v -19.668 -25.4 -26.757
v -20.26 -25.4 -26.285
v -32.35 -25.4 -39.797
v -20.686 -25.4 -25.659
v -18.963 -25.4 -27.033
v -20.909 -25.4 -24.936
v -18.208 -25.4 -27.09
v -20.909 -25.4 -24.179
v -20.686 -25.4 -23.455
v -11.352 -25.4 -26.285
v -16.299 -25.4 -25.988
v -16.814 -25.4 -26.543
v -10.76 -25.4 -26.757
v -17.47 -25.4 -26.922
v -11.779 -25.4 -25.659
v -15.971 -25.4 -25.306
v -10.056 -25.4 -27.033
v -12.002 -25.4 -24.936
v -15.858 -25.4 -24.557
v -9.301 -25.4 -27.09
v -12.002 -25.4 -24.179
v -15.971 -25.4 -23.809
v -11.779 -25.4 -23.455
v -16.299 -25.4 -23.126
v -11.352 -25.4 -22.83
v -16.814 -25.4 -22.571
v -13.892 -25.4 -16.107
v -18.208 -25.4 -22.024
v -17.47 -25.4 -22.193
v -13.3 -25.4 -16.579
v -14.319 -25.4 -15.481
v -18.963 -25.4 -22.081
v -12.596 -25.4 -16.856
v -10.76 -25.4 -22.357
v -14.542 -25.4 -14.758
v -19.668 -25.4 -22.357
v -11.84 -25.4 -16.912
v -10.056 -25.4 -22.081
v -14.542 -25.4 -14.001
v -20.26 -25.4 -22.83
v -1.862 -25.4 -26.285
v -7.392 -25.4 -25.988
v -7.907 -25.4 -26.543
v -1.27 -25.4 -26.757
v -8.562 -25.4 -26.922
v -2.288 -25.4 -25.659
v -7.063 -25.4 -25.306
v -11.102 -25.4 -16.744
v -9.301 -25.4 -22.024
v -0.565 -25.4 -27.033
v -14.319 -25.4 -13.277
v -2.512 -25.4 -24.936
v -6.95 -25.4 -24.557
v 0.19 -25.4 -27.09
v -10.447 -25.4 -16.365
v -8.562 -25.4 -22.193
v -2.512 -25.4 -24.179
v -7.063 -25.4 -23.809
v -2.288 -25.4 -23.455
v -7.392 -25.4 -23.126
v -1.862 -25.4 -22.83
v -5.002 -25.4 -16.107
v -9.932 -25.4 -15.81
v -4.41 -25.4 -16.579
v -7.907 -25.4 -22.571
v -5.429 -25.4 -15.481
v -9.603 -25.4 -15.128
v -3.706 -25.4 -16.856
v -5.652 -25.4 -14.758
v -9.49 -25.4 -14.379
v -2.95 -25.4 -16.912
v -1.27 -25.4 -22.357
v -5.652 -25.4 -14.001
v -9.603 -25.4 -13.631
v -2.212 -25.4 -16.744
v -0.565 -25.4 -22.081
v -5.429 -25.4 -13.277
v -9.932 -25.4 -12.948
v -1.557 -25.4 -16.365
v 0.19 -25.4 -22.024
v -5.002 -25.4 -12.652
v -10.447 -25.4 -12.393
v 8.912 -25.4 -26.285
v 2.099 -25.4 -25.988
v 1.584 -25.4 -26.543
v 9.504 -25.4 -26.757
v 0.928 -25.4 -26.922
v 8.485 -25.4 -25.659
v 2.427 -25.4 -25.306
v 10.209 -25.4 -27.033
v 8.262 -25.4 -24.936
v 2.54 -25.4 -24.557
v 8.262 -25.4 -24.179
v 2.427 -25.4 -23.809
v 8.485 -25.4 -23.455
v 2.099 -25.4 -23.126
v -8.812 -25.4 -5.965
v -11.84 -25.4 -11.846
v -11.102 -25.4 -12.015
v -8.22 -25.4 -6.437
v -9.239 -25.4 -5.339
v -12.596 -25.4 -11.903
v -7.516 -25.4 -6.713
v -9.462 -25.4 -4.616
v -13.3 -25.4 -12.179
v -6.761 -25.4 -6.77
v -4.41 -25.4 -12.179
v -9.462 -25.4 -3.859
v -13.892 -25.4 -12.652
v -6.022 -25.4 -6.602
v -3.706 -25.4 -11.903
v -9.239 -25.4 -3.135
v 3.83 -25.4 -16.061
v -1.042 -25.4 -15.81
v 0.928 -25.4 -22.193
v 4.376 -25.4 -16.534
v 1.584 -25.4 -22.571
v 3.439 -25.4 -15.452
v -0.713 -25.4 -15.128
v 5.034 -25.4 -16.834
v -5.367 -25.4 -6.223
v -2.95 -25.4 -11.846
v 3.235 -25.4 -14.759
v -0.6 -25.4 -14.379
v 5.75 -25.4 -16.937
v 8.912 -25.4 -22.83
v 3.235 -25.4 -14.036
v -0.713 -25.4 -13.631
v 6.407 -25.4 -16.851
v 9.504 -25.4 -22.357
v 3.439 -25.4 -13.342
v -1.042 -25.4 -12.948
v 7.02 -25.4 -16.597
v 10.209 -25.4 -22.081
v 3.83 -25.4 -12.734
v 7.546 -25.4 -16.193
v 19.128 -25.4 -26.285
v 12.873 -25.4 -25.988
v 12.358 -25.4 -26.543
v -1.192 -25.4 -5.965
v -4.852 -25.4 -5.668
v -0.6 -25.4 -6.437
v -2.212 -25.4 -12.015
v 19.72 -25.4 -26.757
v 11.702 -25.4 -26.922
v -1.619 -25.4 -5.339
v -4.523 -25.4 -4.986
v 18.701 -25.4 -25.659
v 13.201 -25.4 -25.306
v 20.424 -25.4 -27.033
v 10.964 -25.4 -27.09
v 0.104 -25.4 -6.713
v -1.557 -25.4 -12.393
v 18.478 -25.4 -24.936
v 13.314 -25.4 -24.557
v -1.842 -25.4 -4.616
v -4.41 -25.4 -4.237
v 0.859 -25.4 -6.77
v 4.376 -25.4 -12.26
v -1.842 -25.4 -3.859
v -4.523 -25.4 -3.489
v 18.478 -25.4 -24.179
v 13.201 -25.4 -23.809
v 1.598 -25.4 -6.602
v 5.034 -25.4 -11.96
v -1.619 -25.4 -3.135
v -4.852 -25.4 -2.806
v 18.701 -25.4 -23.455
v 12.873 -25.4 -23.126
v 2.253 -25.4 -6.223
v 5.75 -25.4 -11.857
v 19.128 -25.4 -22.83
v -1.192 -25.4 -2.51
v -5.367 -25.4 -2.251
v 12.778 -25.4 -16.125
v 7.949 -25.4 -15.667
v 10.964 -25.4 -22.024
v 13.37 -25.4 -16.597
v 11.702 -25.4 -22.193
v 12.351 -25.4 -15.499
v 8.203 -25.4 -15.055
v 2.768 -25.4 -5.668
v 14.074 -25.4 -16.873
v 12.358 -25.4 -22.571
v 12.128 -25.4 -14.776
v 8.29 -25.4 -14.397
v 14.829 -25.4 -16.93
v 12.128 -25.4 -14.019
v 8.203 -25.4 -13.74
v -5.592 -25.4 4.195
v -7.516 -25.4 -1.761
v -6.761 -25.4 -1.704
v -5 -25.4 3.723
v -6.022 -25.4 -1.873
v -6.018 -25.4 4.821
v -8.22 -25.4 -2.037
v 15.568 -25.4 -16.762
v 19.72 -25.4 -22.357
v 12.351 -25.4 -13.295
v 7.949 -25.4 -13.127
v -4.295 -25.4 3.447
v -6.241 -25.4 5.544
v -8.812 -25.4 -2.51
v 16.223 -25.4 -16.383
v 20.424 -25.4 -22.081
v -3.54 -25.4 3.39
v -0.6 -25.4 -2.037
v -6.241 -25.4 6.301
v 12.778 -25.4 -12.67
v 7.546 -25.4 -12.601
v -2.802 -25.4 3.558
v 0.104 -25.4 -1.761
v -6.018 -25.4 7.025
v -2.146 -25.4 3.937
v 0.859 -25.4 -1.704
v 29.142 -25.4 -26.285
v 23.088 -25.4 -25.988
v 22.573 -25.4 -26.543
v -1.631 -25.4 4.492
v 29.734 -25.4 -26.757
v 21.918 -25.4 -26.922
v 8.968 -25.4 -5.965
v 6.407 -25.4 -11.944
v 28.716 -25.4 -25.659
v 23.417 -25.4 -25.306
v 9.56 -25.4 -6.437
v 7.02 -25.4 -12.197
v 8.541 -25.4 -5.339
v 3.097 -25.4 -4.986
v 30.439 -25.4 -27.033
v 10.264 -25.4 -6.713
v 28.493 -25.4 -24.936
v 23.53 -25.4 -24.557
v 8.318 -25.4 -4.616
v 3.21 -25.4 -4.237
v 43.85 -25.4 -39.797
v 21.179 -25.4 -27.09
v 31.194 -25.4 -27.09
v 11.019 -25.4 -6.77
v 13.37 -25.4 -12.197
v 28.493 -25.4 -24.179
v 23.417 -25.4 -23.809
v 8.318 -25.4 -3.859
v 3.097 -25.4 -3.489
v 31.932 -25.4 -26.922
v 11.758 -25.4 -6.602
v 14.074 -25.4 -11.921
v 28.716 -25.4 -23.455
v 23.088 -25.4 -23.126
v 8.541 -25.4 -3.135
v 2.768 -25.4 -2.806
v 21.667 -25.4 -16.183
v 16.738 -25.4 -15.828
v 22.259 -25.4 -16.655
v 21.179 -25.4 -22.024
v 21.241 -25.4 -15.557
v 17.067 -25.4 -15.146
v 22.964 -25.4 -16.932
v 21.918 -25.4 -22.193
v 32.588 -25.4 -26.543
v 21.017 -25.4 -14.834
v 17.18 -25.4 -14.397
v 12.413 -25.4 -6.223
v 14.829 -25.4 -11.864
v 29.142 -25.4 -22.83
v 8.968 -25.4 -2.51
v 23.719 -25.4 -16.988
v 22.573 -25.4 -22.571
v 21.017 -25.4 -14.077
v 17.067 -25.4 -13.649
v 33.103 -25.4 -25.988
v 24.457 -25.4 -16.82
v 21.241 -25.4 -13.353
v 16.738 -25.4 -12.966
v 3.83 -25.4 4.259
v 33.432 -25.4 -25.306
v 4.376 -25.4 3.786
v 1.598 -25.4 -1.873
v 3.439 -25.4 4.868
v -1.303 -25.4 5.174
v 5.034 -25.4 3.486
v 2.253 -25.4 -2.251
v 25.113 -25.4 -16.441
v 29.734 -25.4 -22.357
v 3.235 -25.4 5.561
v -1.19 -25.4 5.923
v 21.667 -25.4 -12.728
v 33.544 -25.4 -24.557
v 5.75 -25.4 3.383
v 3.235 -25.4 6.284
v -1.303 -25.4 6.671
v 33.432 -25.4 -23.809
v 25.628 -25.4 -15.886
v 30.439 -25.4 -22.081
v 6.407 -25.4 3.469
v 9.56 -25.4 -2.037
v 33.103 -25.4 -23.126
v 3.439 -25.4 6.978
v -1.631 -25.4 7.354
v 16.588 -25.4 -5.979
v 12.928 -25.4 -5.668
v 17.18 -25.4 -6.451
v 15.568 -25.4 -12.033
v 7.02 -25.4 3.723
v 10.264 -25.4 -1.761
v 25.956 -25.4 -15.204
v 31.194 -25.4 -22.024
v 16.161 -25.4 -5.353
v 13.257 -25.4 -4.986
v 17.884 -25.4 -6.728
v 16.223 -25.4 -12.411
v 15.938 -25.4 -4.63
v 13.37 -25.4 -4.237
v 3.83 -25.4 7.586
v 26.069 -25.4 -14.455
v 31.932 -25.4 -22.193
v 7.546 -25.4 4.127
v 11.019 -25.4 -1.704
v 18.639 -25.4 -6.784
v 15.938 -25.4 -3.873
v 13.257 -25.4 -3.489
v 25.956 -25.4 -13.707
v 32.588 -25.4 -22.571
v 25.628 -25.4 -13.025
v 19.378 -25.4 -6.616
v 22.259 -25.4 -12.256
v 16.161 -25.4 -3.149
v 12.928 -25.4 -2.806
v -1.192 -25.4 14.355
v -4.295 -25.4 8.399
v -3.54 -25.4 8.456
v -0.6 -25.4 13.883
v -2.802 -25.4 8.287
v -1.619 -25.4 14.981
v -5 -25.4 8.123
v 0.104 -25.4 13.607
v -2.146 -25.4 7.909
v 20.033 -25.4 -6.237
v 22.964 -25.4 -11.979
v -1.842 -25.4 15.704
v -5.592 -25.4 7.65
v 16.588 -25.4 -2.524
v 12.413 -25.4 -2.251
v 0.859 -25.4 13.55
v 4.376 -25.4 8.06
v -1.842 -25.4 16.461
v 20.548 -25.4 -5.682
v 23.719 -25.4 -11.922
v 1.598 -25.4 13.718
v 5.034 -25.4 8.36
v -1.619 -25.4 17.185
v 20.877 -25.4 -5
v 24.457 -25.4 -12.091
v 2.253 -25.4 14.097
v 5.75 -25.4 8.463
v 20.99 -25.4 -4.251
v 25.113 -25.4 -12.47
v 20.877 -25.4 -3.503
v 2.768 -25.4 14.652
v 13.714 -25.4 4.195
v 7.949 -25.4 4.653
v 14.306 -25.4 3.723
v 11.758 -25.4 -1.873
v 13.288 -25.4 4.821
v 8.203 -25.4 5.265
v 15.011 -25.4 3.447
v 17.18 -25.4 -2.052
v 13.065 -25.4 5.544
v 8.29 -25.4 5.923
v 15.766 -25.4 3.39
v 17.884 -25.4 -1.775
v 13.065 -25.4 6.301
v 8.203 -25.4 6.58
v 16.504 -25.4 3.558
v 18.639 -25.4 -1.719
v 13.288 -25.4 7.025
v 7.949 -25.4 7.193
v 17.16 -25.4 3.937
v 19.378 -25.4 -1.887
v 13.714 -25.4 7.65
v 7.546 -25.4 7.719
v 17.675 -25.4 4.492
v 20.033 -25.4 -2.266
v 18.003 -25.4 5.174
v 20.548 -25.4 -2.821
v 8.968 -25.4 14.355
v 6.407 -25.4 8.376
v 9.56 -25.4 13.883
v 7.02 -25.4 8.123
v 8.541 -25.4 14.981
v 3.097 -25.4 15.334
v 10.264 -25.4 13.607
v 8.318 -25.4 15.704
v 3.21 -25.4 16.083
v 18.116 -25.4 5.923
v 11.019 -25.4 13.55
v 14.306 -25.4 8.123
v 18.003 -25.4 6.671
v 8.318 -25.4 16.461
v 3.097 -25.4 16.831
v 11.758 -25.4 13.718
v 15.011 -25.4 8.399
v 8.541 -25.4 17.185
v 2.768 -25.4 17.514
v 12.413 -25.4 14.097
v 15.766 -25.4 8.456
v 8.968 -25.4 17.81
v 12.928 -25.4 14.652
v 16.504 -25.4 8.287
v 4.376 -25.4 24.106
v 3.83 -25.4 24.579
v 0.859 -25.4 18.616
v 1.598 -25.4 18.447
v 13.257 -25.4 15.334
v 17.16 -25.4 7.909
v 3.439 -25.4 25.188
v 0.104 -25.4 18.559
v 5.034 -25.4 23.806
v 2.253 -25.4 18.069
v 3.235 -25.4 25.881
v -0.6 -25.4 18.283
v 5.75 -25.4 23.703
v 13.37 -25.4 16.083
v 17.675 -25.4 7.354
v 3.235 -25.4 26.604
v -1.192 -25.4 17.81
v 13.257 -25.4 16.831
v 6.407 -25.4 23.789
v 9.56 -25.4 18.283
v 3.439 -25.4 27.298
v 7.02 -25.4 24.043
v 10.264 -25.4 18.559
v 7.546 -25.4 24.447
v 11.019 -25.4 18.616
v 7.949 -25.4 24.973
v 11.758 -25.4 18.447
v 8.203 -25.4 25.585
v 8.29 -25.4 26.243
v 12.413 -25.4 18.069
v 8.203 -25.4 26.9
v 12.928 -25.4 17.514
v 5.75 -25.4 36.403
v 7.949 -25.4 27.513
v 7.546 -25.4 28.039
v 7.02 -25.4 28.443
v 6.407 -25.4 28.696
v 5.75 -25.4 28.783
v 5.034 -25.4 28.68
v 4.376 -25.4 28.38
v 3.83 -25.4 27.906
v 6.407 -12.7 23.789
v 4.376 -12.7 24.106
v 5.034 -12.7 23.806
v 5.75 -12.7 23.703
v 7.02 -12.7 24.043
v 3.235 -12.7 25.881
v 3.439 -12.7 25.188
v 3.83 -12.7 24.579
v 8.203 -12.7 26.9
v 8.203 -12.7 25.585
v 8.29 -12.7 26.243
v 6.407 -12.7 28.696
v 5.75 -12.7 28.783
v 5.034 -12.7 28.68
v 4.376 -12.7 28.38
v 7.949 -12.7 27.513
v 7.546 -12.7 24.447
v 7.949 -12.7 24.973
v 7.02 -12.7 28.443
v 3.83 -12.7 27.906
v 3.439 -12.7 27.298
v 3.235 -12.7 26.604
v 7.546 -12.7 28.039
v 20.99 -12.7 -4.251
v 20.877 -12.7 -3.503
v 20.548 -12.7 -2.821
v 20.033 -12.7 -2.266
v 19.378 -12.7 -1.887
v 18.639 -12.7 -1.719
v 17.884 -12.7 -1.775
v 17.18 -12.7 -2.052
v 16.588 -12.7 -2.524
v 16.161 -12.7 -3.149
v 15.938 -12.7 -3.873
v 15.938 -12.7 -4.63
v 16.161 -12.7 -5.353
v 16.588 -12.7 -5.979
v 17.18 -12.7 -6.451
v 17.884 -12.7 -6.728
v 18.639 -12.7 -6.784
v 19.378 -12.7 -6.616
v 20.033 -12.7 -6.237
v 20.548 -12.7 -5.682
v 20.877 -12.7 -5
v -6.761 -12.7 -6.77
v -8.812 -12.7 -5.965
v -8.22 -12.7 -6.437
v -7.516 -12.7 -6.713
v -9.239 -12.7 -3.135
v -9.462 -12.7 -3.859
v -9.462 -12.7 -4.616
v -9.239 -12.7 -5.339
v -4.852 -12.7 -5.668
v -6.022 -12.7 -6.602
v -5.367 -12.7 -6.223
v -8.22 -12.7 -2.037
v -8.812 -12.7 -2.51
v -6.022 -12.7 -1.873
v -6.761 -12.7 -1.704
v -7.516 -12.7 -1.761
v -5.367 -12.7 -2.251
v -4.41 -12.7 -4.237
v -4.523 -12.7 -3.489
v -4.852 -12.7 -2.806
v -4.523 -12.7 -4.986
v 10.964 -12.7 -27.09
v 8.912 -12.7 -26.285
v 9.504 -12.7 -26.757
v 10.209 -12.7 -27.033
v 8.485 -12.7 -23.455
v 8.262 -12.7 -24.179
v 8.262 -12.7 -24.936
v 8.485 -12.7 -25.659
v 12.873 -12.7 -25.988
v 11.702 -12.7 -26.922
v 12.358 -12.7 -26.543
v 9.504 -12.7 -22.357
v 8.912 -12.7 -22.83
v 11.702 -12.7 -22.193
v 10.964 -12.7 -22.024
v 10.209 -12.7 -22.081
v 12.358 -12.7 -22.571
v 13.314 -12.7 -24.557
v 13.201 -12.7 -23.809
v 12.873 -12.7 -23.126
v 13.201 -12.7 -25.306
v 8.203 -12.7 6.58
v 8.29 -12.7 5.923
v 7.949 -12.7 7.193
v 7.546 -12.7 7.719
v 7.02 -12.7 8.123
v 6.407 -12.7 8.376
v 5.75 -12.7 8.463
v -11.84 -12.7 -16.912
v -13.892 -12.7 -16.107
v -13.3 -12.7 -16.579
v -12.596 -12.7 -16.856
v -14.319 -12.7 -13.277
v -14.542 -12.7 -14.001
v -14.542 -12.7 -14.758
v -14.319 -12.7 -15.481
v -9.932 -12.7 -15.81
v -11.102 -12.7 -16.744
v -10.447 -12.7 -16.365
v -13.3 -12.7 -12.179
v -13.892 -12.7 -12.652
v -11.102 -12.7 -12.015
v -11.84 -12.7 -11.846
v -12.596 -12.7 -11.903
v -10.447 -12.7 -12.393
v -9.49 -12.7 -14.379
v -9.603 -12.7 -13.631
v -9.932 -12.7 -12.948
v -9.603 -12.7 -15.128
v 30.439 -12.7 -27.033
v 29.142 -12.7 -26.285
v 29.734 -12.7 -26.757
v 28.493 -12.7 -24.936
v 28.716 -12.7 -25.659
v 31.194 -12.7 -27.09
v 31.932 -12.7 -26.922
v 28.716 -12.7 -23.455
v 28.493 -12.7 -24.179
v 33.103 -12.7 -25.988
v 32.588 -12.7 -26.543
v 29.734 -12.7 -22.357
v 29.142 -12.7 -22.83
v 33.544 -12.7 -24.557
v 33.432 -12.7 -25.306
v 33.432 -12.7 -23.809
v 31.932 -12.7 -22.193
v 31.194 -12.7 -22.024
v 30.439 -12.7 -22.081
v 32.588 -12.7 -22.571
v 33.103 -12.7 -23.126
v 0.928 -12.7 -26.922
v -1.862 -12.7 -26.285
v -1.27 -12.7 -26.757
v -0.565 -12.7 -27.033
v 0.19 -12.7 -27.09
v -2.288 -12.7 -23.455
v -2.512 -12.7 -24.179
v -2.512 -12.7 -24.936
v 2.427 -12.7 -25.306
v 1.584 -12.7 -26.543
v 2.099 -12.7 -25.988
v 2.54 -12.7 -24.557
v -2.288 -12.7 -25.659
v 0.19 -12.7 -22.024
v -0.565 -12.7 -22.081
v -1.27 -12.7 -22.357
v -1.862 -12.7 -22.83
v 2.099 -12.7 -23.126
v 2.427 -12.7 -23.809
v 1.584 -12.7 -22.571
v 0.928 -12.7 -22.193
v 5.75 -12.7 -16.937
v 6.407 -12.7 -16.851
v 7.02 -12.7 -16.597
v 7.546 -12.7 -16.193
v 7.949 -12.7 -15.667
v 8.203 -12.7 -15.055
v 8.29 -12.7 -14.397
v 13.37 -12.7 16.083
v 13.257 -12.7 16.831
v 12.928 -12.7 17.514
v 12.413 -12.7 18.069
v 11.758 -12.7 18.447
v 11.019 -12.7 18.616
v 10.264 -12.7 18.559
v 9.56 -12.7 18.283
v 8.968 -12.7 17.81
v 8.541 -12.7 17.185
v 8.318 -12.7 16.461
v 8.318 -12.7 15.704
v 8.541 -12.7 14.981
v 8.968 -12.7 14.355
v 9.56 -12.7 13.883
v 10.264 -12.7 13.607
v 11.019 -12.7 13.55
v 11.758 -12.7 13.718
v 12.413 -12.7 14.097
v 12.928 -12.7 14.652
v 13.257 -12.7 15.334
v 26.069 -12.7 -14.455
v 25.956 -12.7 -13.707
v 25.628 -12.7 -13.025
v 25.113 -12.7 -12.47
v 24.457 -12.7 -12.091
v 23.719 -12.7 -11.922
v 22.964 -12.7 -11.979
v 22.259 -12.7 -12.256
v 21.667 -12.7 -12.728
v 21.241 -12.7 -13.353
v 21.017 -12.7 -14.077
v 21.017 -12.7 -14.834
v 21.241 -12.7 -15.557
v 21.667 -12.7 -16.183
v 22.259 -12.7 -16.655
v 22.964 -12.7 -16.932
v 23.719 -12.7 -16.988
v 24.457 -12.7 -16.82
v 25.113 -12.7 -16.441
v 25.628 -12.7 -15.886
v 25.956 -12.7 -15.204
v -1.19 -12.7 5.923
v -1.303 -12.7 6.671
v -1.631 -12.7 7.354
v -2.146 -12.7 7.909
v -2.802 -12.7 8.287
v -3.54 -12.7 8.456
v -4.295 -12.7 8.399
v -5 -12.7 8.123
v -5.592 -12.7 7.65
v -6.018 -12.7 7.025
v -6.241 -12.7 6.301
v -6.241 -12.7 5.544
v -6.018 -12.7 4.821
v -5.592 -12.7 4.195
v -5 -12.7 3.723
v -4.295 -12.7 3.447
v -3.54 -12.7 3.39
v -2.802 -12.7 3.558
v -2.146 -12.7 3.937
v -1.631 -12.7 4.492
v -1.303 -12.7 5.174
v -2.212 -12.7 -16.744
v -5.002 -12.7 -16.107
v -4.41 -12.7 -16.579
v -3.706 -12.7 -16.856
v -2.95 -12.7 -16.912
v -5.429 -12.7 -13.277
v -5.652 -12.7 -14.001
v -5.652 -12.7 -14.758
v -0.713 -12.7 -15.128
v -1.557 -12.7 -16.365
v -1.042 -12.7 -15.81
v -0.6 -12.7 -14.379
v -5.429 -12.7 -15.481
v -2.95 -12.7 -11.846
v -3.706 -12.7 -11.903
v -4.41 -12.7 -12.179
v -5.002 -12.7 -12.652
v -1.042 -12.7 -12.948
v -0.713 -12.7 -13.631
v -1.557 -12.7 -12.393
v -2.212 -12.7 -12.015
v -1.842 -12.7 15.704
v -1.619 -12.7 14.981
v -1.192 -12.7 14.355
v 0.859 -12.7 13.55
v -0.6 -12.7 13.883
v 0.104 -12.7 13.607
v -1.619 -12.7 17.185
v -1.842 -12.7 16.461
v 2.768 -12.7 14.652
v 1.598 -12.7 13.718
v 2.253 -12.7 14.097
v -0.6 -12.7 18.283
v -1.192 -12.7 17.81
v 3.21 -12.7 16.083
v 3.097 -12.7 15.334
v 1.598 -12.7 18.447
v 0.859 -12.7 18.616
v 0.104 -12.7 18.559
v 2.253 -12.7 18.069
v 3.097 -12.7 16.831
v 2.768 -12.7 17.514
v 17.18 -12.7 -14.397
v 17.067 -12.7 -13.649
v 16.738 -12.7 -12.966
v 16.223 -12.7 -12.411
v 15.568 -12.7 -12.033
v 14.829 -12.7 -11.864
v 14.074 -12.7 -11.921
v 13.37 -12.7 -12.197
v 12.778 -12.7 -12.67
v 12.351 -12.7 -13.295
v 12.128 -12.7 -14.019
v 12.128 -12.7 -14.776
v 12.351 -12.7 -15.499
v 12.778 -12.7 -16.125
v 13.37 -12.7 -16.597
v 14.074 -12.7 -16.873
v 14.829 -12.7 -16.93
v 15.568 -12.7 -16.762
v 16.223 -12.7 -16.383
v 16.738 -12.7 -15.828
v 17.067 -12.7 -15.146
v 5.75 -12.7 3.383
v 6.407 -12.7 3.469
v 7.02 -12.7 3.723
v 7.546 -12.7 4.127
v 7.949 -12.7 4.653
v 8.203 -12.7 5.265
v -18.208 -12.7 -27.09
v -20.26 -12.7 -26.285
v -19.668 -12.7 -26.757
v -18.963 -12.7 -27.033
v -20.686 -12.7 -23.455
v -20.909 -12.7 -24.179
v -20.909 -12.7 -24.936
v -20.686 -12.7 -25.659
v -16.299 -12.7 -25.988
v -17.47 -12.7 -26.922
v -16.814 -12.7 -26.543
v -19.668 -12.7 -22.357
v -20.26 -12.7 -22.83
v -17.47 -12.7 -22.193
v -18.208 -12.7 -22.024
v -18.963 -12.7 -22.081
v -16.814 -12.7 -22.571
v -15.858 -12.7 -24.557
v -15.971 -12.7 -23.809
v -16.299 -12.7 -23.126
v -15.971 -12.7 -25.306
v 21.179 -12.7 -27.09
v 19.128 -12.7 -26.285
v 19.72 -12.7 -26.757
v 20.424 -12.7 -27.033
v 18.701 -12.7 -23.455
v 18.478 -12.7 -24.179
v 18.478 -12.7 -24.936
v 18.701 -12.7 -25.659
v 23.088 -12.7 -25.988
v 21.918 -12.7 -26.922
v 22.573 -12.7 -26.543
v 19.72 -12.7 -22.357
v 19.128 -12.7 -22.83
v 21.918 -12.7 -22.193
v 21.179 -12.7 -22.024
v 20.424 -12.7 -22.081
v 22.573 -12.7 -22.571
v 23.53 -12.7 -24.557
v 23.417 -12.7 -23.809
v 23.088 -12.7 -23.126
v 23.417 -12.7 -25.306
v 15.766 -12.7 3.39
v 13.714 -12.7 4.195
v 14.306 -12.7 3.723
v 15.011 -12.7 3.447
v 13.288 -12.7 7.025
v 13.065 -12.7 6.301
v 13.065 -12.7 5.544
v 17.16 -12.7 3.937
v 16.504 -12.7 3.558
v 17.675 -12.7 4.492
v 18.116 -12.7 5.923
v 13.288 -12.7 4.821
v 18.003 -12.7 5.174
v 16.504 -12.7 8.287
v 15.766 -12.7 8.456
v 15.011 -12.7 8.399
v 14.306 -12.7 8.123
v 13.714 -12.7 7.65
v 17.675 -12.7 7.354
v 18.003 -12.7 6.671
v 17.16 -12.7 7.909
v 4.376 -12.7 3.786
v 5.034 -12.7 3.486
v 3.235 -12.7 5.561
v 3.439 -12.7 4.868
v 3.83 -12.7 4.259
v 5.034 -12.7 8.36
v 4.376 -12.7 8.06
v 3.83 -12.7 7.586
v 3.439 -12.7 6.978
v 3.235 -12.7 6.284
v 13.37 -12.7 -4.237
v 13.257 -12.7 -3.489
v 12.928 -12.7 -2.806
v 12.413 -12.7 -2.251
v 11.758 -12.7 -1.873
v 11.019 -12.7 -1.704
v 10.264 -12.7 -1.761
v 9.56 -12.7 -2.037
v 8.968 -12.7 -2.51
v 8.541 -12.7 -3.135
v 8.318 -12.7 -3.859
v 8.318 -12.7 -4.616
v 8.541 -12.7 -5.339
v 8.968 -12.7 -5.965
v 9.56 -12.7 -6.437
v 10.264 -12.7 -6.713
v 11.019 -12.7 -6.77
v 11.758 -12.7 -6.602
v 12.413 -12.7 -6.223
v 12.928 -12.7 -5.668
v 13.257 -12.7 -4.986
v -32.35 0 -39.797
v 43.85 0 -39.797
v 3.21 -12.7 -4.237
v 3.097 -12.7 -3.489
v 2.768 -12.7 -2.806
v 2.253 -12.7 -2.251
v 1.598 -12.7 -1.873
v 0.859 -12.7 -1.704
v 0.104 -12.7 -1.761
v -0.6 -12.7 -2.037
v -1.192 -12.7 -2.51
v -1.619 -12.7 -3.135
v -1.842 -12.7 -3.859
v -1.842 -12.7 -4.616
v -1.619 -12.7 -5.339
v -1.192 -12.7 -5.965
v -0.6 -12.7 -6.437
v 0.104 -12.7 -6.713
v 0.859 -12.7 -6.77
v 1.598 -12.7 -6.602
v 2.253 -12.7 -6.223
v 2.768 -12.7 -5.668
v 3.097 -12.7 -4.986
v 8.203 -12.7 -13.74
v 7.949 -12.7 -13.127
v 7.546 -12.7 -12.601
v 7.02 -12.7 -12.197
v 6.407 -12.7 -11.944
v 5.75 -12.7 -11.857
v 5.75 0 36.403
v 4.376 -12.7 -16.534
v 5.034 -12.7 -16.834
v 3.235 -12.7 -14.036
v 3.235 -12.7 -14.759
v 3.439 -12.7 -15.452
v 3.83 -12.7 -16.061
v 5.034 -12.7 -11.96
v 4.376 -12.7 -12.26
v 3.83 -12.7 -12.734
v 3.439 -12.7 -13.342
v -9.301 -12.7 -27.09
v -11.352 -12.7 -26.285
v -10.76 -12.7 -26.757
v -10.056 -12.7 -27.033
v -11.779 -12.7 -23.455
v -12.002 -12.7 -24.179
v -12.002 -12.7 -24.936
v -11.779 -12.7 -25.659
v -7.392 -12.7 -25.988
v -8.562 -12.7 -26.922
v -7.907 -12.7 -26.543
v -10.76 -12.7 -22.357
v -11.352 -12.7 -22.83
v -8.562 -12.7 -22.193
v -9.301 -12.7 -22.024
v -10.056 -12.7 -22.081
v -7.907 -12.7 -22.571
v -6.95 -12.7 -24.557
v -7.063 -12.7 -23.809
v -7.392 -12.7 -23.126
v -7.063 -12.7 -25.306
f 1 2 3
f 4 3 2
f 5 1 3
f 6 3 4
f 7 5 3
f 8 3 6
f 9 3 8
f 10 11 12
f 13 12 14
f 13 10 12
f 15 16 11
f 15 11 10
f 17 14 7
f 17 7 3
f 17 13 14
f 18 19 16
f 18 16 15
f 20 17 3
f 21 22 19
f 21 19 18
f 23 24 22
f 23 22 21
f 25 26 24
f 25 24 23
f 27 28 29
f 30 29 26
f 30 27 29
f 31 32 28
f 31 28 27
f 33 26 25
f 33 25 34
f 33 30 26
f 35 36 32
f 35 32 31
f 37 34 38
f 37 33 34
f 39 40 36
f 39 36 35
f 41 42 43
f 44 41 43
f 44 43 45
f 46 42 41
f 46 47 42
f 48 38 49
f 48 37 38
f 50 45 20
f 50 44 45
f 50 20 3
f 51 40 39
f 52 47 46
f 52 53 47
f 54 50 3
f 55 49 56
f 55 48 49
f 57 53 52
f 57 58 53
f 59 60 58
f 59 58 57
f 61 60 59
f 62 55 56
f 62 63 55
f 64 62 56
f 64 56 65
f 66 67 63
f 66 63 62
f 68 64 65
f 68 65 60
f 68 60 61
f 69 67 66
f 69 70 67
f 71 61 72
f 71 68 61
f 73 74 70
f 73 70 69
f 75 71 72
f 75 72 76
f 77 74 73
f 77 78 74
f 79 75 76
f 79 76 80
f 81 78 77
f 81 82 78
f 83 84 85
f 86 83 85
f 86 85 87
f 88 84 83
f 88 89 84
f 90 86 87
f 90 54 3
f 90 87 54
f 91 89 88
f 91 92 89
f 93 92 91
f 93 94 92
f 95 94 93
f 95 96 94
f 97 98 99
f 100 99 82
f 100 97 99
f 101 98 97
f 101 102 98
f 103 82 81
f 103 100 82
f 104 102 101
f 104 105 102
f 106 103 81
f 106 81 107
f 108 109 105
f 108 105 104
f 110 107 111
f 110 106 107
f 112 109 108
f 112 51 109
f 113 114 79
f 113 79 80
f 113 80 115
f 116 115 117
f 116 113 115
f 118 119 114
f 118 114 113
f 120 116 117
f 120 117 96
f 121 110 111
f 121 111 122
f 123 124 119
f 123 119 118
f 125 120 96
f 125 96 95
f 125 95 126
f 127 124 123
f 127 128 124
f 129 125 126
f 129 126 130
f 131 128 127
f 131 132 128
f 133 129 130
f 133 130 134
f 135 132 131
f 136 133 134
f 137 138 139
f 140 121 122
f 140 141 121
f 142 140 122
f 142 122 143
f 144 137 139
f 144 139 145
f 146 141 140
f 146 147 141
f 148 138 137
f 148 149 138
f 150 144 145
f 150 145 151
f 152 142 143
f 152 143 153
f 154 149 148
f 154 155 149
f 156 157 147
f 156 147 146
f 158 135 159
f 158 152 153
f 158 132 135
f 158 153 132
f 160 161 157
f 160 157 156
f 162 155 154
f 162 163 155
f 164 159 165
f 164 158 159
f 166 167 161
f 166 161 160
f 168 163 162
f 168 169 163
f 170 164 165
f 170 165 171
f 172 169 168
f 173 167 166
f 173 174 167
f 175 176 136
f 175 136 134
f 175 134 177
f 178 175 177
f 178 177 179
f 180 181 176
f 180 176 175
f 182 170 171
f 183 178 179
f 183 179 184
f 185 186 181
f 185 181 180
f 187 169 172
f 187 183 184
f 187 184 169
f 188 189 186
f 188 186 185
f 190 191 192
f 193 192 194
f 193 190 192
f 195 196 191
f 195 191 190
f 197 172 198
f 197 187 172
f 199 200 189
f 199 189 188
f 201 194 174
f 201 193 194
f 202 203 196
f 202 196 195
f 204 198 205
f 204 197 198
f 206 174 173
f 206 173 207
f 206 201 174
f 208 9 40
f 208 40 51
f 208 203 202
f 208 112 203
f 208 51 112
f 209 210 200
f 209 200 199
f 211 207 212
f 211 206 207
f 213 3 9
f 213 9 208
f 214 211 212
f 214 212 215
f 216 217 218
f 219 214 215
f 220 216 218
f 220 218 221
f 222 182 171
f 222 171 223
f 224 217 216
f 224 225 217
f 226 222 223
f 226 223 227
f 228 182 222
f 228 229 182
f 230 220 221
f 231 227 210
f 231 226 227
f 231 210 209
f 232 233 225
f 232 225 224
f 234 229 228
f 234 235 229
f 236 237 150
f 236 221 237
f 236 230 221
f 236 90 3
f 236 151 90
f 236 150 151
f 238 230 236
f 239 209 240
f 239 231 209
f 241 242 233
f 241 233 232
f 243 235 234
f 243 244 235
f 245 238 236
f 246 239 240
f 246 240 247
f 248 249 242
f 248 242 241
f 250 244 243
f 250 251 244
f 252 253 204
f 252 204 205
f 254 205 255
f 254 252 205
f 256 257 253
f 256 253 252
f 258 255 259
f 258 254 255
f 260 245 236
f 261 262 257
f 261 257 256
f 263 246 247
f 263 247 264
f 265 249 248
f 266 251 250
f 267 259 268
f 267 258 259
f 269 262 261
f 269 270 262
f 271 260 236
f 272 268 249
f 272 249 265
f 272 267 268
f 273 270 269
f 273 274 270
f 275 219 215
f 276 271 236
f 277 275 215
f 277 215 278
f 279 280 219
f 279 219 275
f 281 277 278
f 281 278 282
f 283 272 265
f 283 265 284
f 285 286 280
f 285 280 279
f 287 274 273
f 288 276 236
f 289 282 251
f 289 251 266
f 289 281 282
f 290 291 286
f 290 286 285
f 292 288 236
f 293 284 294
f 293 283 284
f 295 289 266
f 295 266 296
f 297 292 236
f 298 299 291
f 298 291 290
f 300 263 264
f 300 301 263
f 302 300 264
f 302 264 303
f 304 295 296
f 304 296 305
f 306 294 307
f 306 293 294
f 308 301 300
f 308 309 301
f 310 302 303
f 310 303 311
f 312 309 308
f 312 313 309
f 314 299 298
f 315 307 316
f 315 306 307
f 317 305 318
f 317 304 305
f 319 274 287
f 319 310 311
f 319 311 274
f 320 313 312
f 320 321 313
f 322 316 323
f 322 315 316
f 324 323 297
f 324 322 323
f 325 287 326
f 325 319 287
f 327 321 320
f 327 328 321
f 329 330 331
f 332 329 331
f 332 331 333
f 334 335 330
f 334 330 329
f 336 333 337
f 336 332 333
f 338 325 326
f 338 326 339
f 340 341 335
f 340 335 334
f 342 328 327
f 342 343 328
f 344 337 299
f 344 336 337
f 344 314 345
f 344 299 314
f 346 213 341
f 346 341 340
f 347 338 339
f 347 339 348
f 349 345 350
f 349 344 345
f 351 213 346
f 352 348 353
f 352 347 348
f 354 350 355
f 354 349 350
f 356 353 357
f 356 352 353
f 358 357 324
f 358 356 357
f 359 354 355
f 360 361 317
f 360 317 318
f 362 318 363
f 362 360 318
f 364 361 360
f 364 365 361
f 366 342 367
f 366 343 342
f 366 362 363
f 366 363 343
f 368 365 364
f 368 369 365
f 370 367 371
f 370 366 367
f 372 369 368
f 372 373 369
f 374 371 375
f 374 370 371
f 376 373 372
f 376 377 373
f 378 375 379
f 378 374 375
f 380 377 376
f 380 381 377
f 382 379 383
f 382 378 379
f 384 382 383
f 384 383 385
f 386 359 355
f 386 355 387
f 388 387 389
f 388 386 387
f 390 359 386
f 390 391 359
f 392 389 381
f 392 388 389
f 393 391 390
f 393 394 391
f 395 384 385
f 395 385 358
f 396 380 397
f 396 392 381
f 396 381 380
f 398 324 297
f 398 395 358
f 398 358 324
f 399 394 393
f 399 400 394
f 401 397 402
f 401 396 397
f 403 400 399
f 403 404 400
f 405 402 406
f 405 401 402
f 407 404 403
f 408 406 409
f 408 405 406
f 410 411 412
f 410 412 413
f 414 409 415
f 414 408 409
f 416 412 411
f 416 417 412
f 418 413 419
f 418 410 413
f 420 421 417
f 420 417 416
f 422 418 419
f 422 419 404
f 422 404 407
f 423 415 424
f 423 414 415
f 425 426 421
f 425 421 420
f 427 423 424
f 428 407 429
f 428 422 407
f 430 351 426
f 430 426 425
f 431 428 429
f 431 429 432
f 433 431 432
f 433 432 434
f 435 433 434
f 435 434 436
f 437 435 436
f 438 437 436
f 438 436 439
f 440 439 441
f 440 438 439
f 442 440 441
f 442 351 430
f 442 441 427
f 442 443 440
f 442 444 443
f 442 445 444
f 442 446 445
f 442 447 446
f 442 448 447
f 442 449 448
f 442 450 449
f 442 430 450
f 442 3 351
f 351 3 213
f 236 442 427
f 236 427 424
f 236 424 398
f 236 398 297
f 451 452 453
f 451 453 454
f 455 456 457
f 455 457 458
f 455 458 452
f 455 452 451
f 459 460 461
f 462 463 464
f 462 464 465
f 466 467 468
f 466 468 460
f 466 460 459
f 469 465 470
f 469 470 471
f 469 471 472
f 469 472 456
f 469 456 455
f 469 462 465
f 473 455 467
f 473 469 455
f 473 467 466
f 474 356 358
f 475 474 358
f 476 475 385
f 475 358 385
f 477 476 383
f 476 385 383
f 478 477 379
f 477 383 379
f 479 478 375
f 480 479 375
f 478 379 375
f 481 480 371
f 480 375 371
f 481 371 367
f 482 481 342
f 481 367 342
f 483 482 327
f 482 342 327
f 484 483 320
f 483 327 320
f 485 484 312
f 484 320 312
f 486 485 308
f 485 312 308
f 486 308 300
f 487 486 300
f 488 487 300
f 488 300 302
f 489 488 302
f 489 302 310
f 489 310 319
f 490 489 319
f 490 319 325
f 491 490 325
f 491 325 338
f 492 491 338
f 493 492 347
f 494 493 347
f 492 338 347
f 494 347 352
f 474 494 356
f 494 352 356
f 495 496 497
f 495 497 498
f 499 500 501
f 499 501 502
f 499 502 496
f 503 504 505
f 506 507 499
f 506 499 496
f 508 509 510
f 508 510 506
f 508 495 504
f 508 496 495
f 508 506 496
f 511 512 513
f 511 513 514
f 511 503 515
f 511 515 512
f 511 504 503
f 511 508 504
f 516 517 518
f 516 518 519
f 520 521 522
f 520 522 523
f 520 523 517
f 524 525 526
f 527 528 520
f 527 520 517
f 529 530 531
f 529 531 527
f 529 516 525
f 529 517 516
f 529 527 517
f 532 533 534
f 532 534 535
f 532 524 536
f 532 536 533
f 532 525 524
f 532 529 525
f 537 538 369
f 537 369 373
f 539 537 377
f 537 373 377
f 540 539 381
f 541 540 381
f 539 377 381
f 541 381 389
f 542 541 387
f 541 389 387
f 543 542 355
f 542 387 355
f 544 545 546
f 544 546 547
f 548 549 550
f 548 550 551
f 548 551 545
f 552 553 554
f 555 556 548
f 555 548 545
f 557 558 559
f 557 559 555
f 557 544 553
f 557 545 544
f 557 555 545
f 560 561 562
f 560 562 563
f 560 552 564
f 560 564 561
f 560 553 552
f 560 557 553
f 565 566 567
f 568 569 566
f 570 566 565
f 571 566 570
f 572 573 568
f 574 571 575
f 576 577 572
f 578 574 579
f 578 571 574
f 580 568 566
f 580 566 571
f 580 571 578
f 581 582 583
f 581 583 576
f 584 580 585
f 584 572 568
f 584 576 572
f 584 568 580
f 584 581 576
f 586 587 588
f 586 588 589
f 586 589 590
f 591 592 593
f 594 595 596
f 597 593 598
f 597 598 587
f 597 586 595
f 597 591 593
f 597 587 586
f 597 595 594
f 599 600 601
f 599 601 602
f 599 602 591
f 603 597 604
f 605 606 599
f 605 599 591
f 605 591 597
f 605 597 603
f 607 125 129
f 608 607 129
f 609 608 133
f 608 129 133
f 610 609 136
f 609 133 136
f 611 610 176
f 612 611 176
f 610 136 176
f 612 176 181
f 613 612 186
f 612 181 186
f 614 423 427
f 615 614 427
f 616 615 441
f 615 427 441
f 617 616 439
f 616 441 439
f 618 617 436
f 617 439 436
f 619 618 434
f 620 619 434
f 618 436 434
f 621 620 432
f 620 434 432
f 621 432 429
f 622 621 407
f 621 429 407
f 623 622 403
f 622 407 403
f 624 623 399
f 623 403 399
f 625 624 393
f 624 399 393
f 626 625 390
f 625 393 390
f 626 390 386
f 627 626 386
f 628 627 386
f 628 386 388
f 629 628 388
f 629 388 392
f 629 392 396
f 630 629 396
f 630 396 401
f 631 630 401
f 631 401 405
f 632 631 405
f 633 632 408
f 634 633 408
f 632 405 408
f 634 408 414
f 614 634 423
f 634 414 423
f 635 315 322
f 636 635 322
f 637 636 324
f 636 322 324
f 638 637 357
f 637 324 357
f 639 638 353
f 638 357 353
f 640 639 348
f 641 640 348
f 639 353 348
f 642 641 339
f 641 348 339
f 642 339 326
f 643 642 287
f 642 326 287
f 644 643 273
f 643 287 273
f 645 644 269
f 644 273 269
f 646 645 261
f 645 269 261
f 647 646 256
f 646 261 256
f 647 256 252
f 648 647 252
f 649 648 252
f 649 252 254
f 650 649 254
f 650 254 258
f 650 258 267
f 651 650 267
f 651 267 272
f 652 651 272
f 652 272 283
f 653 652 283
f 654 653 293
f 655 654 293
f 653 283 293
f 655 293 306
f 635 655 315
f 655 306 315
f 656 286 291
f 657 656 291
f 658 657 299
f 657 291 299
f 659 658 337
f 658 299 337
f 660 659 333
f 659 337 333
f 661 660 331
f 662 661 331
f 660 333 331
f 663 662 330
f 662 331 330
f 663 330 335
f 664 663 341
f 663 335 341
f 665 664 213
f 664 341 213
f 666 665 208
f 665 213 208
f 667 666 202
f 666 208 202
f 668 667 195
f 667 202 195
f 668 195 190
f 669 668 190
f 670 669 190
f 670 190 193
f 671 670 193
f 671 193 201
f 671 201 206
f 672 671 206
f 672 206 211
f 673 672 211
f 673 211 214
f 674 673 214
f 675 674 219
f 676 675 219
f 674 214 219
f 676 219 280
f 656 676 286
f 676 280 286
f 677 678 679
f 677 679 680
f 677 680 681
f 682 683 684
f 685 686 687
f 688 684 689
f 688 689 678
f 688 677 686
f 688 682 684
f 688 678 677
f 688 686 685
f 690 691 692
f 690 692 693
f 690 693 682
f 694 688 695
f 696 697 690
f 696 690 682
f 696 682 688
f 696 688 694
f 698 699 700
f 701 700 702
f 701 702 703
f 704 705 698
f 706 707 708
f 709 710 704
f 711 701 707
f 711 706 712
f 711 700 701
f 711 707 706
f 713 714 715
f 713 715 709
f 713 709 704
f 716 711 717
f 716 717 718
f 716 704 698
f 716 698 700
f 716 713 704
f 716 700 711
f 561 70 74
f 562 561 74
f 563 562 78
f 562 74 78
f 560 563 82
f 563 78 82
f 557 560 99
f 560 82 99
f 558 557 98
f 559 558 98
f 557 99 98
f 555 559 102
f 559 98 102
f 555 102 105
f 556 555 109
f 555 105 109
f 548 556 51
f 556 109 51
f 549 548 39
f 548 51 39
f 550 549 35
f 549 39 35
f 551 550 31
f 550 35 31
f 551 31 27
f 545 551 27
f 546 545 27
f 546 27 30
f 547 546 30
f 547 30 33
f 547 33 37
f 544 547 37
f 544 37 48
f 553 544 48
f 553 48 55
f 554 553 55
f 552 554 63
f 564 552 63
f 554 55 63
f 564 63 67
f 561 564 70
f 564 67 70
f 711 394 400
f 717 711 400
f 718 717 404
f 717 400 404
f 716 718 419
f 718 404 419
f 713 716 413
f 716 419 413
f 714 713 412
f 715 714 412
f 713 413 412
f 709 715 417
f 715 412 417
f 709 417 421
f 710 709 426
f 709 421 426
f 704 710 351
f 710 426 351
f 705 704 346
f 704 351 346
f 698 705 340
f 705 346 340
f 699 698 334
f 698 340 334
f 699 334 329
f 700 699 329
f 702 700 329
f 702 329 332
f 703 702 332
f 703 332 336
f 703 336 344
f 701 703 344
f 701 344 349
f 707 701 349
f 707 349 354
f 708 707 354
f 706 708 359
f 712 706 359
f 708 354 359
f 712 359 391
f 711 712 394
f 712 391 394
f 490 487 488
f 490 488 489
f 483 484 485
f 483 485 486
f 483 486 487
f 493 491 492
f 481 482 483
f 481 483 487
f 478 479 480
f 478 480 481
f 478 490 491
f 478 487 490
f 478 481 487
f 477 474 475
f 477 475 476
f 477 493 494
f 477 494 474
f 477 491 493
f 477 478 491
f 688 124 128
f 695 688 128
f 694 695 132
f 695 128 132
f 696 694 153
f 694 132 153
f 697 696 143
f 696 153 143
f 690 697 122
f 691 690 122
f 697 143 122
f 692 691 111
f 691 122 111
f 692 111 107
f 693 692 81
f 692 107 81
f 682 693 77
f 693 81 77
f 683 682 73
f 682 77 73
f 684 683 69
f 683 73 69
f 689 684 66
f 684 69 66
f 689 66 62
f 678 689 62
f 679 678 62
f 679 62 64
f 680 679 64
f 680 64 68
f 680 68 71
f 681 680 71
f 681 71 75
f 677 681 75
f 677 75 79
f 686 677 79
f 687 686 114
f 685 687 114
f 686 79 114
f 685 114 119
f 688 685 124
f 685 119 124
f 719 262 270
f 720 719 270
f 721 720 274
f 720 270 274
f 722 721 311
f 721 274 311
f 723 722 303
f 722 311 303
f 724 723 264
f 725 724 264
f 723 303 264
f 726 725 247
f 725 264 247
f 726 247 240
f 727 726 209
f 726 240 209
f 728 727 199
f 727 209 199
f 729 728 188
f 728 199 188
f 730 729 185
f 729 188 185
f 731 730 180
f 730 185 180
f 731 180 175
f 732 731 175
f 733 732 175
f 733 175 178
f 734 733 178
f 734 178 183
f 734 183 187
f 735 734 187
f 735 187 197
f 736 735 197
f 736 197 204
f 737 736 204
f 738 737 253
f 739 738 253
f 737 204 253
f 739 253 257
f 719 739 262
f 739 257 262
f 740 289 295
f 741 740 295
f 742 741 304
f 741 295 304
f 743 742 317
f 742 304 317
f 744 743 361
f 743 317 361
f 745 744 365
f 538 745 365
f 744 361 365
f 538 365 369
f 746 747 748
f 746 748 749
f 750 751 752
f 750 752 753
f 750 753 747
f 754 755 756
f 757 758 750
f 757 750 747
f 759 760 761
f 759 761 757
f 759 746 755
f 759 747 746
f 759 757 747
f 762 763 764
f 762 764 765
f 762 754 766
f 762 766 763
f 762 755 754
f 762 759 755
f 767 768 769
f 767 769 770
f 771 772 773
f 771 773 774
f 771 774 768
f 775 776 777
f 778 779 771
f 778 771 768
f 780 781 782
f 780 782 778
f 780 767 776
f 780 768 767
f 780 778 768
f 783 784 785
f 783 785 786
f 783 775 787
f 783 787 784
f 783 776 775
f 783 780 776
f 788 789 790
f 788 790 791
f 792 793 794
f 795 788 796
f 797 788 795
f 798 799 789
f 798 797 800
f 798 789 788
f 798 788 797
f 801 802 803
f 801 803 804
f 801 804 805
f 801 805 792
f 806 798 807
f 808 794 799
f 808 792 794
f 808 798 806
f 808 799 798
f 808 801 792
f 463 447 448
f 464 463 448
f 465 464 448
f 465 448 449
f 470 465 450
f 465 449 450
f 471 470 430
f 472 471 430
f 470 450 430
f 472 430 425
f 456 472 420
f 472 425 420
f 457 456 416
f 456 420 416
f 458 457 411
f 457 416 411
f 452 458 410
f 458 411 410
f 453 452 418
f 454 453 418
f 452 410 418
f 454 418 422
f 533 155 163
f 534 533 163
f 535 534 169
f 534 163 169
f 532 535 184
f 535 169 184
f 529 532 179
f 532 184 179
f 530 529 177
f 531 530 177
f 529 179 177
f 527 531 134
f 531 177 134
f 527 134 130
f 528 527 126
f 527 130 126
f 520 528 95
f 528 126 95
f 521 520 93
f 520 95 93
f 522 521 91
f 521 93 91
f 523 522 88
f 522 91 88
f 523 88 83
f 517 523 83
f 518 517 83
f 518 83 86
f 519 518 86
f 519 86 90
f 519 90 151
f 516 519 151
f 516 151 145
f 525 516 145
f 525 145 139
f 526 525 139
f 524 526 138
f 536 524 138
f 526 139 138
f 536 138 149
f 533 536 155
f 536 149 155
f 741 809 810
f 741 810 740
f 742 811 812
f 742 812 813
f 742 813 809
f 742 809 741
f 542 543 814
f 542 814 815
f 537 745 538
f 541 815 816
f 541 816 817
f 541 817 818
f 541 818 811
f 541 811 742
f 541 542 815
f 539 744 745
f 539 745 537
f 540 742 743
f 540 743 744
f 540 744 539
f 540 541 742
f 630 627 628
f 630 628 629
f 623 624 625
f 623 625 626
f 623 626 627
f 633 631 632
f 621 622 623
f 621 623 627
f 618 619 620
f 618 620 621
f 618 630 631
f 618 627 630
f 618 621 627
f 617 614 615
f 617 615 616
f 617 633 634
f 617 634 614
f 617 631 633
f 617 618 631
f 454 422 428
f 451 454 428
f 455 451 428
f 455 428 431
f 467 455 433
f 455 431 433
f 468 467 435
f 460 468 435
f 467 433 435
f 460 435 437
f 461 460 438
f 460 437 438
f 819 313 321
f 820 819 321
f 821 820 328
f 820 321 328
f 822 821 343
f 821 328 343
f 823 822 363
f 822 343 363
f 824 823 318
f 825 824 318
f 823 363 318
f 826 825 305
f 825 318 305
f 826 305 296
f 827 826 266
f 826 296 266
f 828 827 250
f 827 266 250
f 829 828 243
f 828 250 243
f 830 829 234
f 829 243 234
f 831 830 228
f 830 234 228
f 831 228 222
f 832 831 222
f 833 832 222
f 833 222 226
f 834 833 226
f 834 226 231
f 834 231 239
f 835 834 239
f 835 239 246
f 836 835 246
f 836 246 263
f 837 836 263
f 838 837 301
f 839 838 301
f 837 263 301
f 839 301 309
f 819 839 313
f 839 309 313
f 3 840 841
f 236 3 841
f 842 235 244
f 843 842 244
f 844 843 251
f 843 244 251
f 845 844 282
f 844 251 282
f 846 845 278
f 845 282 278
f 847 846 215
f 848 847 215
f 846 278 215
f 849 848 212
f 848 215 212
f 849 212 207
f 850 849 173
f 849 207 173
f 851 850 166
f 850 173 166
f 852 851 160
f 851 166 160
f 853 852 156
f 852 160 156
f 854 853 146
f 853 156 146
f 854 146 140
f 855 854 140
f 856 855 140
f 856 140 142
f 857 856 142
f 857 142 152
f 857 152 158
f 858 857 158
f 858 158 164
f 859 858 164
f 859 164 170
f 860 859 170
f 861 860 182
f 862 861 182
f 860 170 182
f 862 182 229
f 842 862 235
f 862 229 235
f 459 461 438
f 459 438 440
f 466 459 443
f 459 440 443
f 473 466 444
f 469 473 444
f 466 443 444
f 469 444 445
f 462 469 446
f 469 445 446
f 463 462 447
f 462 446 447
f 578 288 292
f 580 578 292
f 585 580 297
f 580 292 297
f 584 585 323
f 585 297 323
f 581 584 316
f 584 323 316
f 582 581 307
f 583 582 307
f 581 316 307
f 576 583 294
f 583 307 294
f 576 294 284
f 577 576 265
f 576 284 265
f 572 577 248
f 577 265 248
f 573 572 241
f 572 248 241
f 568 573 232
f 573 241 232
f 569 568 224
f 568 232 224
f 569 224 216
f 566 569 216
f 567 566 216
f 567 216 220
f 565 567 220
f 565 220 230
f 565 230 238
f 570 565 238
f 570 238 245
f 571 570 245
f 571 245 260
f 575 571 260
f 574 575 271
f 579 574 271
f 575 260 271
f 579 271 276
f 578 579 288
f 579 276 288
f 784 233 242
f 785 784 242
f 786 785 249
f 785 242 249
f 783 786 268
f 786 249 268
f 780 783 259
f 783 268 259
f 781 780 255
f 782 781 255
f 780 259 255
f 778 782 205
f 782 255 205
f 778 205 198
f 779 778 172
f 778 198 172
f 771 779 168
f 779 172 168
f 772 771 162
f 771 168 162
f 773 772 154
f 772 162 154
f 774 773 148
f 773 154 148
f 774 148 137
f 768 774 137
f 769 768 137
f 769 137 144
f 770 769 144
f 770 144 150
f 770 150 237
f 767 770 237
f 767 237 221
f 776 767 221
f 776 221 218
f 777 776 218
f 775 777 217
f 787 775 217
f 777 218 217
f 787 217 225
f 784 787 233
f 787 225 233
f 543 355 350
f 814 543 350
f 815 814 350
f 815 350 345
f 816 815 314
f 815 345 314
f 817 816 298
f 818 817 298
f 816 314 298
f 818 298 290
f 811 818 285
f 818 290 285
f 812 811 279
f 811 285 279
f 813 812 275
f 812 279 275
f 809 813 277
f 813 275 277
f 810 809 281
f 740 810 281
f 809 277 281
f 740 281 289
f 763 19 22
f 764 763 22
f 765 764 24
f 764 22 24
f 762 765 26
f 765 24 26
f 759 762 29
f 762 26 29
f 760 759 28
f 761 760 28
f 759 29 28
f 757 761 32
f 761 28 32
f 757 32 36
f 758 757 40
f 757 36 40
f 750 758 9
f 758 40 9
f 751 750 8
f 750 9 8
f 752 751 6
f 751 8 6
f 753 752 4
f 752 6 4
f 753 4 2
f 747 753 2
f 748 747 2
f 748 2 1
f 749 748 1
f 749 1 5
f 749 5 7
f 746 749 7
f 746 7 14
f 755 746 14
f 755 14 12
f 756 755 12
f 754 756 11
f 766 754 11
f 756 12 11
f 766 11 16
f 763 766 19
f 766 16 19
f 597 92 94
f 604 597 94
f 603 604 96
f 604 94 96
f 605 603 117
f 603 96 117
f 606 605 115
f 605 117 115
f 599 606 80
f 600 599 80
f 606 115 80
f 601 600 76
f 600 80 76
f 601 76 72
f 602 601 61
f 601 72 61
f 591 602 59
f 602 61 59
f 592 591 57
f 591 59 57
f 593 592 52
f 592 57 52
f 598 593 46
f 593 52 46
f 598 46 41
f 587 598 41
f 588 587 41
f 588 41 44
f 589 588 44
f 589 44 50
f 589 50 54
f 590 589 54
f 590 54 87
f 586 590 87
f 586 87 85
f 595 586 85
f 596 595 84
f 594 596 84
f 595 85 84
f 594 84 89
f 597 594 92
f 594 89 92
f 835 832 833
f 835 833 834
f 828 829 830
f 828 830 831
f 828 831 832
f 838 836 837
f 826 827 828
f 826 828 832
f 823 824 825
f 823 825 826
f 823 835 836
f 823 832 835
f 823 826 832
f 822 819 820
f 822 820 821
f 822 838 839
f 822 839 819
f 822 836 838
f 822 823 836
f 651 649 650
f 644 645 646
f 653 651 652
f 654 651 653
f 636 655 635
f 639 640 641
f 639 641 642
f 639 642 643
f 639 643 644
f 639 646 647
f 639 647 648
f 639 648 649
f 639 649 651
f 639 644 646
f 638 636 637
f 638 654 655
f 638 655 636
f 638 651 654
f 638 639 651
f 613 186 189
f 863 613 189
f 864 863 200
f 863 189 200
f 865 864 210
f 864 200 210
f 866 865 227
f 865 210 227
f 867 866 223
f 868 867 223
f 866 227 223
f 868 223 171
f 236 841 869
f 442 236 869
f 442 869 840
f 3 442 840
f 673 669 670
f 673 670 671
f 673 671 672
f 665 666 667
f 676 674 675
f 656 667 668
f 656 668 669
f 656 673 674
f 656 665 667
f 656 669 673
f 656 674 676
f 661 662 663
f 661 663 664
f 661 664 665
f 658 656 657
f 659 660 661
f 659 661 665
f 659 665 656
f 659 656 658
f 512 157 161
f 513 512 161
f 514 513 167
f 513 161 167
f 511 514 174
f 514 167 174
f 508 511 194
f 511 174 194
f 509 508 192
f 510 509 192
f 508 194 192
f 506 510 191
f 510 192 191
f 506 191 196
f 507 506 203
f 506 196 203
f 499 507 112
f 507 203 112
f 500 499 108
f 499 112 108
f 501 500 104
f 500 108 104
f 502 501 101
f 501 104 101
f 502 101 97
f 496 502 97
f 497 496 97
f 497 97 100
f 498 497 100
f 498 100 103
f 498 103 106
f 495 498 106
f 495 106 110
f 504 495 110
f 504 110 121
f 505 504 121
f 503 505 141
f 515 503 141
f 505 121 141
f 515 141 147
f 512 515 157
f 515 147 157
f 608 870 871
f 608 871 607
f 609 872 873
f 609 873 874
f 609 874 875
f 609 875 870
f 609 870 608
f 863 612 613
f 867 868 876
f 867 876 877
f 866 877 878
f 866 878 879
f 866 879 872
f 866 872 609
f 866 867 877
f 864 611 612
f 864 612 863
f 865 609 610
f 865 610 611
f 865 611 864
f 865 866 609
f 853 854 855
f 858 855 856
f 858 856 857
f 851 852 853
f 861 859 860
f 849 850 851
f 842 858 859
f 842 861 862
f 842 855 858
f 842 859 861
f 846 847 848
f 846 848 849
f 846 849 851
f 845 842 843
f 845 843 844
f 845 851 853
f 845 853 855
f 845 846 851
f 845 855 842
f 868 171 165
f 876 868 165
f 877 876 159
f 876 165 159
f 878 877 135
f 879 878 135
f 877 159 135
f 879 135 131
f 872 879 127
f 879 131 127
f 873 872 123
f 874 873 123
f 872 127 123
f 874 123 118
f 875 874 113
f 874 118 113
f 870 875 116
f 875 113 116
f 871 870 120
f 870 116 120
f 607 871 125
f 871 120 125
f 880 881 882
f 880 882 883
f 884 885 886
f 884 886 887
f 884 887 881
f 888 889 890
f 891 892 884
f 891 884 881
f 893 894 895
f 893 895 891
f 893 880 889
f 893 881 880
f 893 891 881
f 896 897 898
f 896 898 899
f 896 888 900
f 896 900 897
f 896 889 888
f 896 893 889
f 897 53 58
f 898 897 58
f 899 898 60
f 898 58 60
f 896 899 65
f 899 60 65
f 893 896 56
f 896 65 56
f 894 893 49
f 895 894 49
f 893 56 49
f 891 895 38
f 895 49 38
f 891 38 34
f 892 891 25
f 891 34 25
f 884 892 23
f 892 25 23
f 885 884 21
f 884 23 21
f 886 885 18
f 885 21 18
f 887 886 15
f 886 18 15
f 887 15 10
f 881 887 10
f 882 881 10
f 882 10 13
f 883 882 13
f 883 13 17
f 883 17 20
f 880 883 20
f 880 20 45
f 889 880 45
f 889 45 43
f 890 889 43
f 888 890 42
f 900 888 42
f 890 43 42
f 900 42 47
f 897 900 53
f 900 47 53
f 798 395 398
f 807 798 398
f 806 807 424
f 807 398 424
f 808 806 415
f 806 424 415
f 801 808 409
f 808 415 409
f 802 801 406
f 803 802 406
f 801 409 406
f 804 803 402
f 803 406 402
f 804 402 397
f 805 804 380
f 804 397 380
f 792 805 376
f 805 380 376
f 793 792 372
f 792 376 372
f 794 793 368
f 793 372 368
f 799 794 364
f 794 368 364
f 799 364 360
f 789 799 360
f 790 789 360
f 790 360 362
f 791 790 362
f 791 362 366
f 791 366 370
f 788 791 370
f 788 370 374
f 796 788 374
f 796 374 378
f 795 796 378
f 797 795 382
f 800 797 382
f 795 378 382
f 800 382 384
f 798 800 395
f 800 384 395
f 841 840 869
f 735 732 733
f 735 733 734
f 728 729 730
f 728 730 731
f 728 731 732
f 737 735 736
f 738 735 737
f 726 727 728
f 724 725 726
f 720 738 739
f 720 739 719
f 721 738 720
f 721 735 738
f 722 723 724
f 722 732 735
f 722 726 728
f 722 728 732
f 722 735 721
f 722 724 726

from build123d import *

# Parameters (mm, degrees)
F1_DEPTH = 25.4
F2_R     = 2.54
F3_DEPTH = 12.7


with BuildPart() as f1:
    # F0 (on Front) → F1 (new body)
    with BuildSketch(Plane.XZ):
        Polygon((5.74964, 36.402817), (-32.35036, -39.797183), (5.74964, -39.797183), (5.74964, 34.851611), align=None)
        Polygon((5.74964, 34.851611), (5.74964, -39.797183), (43.84964, -39.797183), (5.74964, 36.402817), align=None)
    extrude(amount=F1_DEPTH)

    # F2 (on face) → F3 (cut)
    with BuildSketch(Plane.XZ.offset(25.4)):
        with BuildLine():
            ThreePointArc((8.28964, 26.242817), (7.545691, 28.038868), (5.74964, 28.782817))
            Line((5.74964, 28.782817), (5.74964, 26.242817))
            Line((5.74964, 26.242817), (5.74964, 23.702817))
            ThreePointArc((5.74964, 23.702817), (7.545691, 24.446766), (8.28964, 26.242817))
        make_face()
        with BuildLine():
            ThreePointArc((8.28964, -14.397183), (7.545691, -12.601132), (5.74964, -11.857183))
            Line((5.74964, -11.857183), (5.74964, -14.397183))
            Line((5.74964, -14.397183), (5.74964, -16.937183))
            ThreePointArc((5.74964, -16.937183), (7.545691, -16.193234), (8.28964, -14.397183))
        make_face()
        with BuildLine():
            Line((5.74964, -14.397183), (5.74964, -11.857183))
            ThreePointArc((5.74964, -11.857183), (3.20964, -14.397183), (5.74964, -16.937183))
            Line((5.74964, -16.937183), (5.74964, -14.397183))
        make_face()
        with BuildLine():
            ThreePointArc((8.28964, 5.922817), (7.545691, 7.718868), (5.74964, 8.462817))
            Line((5.74964, 8.462817), (5.74964, 5.922817))
            Line((5.74964, 5.922817), (5.74964, 3.382817))
            ThreePointArc((5.74964, 3.382817), (7.545691, 4.126766), (8.28964, 5.922817))
        make_face()
        with BuildLine():
            Line((5.74964, 5.922817), (5.74964, 8.462817))
            ThreePointArc((5.74964, 8.462817), (3.20964, 5.922817), (5.74964, 3.382817))
            Line((5.74964, 3.382817), (5.74964, 5.922817))
        make_face()
        with BuildLine():
            Line((5.74964, 26.242817), (5.74964, 28.782817))
            ThreePointArc((5.74964, 28.782817), (3.20964, 26.242817), (5.74964, 23.702817))
            Line((5.74964, 23.702817), (5.74964, 26.242817))
        make_face()
        with Locations((0.66964, 16.082817)):
            Circle(F2_R)
        with Locations((10.82964, 16.082817)):
            Circle(F2_R)
        with Locations((-3.729841, 5.922817)):
            Circle(F2_R)
        with BuildLine():
            ThreePointArc((13.036175, 5.922817), (15.576175, 3.382817), (18.116175, 5.922817))
            ThreePointArc((18.116175, 5.922817), (15.576175, 8.462817), (13.036175, 5.922817))
        make_face()
        with Locations((0.66964, -4.237183)):
            Circle(F2_R)
        with Locations((-6.95036, -4.237183)):
            Circle(F2_R)
        with Locations((10.82964, -4.237183)):
            Circle(F2_R)
        with Locations((18.4496, -4.251403)):
            Circle(F2_R)
        with Locations((-3.140297, -14.379193)):
            Circle(F2_R)
        with Locations((-12.030297, -14.379193)):
            Circle(F2_R)
        with BuildLine():
            ThreePointArc((12.09964, -14.397183), (14.63964, -16.937183), (17.17964, -14.397183))
            ThreePointArc((17.17964, -14.397183), (14.63964, -11.857183), (12.09964, -14.397183))
        make_face()
        with BuildLine():
            ThreePointArc((20.988973, -14.455365), (23.528973, -16.995365), (26.068973, -14.455365))
            ThreePointArc((26.068973, -14.455365), (23.528973, -11.915365), (20.988973, -14.455365))
        make_face()
        with Locations((0, -24.557183)):
            Circle(F2_R)
        with Locations((-9.49036, -24.557183)):
            Circle(F2_R)
        with Locations((-18.397864, -24.557183)):
            Circle(F2_R)
        with Locations((10.773869, -24.557183)):
            Circle(F2_R)
        with Locations((20.98964, -24.557183)):
            Circle(F2_R)
        with Locations((31.00442, -24.557183)):
            Circle(F2_R)
    extrude(amount=-F3_DEPTH, mode=Mode.SUBTRACT)


solid = f1.part
